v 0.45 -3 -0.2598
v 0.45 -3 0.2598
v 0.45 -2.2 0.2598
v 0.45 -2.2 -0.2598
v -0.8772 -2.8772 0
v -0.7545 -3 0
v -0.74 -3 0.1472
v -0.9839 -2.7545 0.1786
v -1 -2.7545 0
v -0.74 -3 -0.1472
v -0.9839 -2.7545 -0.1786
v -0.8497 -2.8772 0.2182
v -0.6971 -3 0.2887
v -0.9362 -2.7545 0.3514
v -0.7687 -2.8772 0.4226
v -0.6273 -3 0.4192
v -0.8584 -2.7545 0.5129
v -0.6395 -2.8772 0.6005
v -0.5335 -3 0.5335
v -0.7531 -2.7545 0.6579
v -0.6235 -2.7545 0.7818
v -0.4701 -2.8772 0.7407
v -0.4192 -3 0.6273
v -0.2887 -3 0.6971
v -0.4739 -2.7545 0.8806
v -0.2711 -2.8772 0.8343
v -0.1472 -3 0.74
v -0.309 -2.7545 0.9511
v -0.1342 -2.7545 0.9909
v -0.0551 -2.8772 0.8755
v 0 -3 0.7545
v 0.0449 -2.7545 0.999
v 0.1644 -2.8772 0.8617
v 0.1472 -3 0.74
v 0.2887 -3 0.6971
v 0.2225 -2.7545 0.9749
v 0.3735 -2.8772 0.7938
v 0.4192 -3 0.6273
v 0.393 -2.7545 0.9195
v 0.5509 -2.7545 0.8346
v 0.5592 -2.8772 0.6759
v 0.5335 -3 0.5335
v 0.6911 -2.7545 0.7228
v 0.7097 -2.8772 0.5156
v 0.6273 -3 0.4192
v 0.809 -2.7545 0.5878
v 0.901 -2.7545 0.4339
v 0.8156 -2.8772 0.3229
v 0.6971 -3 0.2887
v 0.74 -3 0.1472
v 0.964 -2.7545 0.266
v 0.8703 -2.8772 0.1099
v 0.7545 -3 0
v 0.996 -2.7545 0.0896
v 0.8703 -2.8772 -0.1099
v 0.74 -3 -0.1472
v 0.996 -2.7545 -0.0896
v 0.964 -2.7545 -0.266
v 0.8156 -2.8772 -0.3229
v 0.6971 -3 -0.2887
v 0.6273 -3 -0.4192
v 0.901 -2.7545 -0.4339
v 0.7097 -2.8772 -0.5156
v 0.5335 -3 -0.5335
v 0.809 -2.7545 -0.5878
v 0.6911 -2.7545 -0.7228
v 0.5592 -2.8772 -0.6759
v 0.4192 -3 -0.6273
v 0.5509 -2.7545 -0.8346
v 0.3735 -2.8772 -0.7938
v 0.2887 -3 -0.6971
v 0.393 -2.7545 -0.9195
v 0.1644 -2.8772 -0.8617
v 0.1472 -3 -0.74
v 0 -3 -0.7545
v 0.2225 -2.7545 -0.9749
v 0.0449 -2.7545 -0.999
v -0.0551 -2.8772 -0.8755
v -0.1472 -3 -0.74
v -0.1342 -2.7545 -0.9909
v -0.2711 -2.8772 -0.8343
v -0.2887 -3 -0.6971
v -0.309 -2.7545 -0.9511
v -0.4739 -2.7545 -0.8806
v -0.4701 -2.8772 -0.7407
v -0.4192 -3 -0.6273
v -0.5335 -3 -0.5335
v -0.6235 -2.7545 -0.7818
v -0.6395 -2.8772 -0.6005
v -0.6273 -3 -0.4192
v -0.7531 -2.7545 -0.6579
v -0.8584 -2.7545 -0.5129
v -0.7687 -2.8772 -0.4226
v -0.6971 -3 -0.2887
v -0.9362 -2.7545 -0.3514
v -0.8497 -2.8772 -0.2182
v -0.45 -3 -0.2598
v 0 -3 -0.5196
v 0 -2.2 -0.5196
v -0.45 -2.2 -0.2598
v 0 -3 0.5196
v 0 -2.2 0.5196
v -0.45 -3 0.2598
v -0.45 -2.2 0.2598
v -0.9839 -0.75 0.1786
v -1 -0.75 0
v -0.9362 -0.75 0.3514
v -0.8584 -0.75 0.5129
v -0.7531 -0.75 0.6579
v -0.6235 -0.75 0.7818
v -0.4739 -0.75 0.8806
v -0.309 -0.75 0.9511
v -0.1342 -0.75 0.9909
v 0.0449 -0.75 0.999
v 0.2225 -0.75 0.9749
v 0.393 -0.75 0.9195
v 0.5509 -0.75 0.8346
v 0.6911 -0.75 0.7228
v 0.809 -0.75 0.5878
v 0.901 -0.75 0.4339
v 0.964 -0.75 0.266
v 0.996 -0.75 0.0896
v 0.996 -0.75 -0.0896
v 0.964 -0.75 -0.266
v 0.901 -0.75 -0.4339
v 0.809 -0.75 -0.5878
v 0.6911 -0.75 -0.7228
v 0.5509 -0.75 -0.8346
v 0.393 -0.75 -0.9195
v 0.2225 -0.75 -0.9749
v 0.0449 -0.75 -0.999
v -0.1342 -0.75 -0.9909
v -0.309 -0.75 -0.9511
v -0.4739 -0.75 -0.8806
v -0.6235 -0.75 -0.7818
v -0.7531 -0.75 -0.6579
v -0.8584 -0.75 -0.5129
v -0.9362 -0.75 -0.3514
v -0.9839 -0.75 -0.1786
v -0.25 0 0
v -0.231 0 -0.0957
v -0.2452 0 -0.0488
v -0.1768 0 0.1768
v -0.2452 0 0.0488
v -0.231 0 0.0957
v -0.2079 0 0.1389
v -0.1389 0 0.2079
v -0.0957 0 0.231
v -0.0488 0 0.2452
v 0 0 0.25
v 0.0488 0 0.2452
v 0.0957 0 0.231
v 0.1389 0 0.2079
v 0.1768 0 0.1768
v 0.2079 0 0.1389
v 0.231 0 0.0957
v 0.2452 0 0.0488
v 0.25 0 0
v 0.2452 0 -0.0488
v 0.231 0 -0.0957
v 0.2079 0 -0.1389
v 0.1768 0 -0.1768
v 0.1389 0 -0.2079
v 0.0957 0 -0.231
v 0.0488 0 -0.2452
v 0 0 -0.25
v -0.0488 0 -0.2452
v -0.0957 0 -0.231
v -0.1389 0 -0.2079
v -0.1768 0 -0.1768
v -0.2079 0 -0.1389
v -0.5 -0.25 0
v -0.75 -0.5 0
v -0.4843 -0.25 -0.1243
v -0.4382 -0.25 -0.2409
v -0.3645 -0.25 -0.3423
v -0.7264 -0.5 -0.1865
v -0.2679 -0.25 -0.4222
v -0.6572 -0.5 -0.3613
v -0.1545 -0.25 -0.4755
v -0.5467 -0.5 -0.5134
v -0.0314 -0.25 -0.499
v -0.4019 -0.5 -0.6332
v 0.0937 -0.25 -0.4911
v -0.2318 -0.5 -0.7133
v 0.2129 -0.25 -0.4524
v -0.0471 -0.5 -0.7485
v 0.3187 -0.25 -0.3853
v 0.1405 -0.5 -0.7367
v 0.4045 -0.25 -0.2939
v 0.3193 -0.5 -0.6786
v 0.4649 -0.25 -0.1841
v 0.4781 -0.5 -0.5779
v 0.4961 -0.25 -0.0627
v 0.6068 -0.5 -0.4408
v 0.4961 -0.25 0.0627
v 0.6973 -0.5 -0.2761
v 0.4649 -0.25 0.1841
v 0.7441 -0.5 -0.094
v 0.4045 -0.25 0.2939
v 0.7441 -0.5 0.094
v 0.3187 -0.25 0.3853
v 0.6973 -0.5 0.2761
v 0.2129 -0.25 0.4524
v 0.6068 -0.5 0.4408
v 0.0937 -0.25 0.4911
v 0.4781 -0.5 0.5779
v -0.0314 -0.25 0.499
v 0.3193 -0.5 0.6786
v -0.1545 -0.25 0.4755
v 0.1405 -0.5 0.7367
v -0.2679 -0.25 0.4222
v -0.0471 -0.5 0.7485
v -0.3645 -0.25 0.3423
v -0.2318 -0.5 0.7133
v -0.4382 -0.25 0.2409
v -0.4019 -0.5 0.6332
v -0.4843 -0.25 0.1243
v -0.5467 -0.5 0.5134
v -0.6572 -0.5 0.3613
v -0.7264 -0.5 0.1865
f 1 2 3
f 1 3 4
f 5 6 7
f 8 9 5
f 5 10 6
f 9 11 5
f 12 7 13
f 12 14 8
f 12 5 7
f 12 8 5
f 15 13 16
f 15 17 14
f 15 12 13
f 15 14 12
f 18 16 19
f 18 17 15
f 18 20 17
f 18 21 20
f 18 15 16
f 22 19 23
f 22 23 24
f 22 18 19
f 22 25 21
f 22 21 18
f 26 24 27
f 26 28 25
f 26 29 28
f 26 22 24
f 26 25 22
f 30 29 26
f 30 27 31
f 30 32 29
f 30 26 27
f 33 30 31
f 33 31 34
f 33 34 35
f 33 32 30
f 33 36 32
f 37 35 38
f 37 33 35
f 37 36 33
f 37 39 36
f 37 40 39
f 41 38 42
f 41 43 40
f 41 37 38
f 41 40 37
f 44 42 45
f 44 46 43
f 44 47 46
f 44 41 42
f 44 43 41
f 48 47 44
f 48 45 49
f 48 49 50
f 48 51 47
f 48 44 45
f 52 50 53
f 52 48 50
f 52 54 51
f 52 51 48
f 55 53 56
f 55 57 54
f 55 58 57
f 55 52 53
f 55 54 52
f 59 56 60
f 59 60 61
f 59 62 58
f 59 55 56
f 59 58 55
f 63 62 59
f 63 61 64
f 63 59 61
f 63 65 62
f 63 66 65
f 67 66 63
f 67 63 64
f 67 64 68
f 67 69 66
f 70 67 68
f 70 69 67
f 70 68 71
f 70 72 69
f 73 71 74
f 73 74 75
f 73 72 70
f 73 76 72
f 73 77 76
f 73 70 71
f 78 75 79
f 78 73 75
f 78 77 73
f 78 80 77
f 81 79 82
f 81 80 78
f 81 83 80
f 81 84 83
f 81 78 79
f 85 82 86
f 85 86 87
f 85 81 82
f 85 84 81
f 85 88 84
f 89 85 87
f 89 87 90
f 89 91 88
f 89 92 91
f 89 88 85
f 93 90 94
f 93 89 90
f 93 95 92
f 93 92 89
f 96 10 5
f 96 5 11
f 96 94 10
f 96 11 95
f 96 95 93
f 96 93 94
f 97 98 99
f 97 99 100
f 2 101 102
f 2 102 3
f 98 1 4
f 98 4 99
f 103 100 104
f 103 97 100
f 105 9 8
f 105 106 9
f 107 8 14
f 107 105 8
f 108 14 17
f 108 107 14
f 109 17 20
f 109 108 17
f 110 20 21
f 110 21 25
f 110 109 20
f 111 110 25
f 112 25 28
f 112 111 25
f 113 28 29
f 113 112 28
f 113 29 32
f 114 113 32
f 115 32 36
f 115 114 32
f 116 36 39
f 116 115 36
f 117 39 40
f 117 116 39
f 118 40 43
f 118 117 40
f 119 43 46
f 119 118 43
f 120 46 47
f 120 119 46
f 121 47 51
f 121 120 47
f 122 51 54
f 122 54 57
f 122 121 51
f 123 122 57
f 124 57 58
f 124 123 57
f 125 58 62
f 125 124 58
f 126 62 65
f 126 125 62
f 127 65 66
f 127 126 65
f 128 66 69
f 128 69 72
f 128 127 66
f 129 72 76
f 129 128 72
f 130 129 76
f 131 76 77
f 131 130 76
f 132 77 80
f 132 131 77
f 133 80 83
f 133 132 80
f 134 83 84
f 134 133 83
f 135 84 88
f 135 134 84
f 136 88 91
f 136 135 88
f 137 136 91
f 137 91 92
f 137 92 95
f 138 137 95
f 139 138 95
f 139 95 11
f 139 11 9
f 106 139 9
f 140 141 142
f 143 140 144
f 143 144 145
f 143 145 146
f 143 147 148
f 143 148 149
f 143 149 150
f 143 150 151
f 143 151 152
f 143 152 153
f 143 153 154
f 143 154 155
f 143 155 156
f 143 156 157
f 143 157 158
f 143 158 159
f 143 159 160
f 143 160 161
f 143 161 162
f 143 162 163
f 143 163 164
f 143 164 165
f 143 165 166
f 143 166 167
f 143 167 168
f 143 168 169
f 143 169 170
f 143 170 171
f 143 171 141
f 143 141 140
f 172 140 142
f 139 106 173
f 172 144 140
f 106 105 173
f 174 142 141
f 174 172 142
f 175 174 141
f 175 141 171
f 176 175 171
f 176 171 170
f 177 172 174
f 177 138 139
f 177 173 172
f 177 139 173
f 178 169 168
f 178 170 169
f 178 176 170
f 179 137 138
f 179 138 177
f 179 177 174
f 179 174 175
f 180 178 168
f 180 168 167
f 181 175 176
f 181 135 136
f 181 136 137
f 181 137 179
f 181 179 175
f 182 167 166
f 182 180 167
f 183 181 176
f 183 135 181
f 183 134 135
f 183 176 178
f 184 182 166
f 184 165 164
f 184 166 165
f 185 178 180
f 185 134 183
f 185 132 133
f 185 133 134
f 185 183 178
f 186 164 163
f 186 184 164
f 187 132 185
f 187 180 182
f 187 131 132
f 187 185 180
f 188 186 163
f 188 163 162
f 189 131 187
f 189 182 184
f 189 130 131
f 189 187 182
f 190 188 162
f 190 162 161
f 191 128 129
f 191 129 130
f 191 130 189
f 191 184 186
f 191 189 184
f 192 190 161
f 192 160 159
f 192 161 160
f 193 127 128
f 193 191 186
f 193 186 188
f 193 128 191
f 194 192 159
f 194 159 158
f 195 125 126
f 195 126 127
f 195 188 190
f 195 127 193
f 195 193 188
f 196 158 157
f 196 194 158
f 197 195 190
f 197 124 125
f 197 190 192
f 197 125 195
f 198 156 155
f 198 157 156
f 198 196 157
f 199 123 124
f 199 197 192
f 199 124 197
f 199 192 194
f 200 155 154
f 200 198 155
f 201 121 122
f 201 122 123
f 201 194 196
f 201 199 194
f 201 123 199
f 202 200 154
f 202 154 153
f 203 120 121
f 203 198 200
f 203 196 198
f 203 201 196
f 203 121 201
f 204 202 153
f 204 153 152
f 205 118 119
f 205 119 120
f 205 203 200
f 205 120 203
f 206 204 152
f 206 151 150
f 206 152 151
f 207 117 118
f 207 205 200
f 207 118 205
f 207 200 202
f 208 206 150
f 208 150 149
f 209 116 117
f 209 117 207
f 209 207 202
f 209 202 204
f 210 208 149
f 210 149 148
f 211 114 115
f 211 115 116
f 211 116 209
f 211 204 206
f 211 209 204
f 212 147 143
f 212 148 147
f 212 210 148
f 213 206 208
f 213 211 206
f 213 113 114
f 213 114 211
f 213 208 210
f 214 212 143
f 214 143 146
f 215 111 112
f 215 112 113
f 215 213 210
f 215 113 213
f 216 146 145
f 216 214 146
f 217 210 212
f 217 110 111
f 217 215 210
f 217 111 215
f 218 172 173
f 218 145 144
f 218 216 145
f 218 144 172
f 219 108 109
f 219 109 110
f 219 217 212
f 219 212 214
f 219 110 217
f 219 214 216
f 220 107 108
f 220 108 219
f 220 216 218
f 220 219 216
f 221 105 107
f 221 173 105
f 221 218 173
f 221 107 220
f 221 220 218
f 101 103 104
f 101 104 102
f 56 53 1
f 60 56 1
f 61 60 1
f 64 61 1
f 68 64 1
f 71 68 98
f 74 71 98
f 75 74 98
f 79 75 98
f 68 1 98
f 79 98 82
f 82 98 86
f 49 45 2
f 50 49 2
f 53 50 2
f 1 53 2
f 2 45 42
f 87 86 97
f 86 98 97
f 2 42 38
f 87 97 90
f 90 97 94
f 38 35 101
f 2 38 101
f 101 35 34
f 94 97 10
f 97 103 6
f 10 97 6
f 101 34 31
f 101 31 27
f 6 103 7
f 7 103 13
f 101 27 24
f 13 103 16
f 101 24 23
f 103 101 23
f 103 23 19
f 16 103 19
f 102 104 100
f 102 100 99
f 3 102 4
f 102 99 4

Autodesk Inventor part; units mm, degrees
sketch "Sketch_4" plane through (0, 0, 0) normal (0, 0, 1) x (1, 0, 0)
  line L0 (0, 0) -> (0, -3)
  line L1 (0, -3) -> (-0.7545, -3)
  line L2 (-0.7545, -3) -> (-1, -2.7545)
  line L3 (-1, -2.7545) -> (-1, -0.75)
  line L4 (-1, -0.75) -> (-0.25, 0)
  line L5 (-0.25, 0) -> (0, 0)
  line L6 (0, 0) -> (0, -3)
revolve "Revolution1" add sketch "Sketch_4" angle 360 about axis through (0, 0, 0) along (0, 1, 0)
thread "Thread1" size "M2x0.4" class "6g" standard "ISO Metric profile" full length
sketch "Sketch_6" plane through (0, -3, 0) normal (0, 1, 0) x (1, 0, 0)
  line L0 (-0.45, -0.2598) -> (0, -0.5196)
  line L1 (0, -0.5196) -> (0.45, -0.2598)
  line L2 (0.45, -0.2598) -> (0.45, 0.2598)
  line L3 (0.45, 0.2598) -> (0, 0.5196)
  line L4 (0, 0.5196) -> (-0.45, 0.2598)
  line L5 (-0.45, 0.2598) -> (-0.45, -0.2598)
extrude "Extrusion1" cut sketch "Sketch_6" along normal blind 0.8
ref_plane "gst_27434_4027_XY" through (0, -2, 0) normal (0, 1, 0) x (1, 0, 0)
ref_plane "gst_27434_4027_YZ" through (0, -2, 0) normal (1, 0, 0) x (0, 0, -1)
ref_plane "gst_27434_4027_ZX" through (0, -2, 0) normal (0, 0, -1) x (0, 1, 0)
properties part number "623890036_2"
